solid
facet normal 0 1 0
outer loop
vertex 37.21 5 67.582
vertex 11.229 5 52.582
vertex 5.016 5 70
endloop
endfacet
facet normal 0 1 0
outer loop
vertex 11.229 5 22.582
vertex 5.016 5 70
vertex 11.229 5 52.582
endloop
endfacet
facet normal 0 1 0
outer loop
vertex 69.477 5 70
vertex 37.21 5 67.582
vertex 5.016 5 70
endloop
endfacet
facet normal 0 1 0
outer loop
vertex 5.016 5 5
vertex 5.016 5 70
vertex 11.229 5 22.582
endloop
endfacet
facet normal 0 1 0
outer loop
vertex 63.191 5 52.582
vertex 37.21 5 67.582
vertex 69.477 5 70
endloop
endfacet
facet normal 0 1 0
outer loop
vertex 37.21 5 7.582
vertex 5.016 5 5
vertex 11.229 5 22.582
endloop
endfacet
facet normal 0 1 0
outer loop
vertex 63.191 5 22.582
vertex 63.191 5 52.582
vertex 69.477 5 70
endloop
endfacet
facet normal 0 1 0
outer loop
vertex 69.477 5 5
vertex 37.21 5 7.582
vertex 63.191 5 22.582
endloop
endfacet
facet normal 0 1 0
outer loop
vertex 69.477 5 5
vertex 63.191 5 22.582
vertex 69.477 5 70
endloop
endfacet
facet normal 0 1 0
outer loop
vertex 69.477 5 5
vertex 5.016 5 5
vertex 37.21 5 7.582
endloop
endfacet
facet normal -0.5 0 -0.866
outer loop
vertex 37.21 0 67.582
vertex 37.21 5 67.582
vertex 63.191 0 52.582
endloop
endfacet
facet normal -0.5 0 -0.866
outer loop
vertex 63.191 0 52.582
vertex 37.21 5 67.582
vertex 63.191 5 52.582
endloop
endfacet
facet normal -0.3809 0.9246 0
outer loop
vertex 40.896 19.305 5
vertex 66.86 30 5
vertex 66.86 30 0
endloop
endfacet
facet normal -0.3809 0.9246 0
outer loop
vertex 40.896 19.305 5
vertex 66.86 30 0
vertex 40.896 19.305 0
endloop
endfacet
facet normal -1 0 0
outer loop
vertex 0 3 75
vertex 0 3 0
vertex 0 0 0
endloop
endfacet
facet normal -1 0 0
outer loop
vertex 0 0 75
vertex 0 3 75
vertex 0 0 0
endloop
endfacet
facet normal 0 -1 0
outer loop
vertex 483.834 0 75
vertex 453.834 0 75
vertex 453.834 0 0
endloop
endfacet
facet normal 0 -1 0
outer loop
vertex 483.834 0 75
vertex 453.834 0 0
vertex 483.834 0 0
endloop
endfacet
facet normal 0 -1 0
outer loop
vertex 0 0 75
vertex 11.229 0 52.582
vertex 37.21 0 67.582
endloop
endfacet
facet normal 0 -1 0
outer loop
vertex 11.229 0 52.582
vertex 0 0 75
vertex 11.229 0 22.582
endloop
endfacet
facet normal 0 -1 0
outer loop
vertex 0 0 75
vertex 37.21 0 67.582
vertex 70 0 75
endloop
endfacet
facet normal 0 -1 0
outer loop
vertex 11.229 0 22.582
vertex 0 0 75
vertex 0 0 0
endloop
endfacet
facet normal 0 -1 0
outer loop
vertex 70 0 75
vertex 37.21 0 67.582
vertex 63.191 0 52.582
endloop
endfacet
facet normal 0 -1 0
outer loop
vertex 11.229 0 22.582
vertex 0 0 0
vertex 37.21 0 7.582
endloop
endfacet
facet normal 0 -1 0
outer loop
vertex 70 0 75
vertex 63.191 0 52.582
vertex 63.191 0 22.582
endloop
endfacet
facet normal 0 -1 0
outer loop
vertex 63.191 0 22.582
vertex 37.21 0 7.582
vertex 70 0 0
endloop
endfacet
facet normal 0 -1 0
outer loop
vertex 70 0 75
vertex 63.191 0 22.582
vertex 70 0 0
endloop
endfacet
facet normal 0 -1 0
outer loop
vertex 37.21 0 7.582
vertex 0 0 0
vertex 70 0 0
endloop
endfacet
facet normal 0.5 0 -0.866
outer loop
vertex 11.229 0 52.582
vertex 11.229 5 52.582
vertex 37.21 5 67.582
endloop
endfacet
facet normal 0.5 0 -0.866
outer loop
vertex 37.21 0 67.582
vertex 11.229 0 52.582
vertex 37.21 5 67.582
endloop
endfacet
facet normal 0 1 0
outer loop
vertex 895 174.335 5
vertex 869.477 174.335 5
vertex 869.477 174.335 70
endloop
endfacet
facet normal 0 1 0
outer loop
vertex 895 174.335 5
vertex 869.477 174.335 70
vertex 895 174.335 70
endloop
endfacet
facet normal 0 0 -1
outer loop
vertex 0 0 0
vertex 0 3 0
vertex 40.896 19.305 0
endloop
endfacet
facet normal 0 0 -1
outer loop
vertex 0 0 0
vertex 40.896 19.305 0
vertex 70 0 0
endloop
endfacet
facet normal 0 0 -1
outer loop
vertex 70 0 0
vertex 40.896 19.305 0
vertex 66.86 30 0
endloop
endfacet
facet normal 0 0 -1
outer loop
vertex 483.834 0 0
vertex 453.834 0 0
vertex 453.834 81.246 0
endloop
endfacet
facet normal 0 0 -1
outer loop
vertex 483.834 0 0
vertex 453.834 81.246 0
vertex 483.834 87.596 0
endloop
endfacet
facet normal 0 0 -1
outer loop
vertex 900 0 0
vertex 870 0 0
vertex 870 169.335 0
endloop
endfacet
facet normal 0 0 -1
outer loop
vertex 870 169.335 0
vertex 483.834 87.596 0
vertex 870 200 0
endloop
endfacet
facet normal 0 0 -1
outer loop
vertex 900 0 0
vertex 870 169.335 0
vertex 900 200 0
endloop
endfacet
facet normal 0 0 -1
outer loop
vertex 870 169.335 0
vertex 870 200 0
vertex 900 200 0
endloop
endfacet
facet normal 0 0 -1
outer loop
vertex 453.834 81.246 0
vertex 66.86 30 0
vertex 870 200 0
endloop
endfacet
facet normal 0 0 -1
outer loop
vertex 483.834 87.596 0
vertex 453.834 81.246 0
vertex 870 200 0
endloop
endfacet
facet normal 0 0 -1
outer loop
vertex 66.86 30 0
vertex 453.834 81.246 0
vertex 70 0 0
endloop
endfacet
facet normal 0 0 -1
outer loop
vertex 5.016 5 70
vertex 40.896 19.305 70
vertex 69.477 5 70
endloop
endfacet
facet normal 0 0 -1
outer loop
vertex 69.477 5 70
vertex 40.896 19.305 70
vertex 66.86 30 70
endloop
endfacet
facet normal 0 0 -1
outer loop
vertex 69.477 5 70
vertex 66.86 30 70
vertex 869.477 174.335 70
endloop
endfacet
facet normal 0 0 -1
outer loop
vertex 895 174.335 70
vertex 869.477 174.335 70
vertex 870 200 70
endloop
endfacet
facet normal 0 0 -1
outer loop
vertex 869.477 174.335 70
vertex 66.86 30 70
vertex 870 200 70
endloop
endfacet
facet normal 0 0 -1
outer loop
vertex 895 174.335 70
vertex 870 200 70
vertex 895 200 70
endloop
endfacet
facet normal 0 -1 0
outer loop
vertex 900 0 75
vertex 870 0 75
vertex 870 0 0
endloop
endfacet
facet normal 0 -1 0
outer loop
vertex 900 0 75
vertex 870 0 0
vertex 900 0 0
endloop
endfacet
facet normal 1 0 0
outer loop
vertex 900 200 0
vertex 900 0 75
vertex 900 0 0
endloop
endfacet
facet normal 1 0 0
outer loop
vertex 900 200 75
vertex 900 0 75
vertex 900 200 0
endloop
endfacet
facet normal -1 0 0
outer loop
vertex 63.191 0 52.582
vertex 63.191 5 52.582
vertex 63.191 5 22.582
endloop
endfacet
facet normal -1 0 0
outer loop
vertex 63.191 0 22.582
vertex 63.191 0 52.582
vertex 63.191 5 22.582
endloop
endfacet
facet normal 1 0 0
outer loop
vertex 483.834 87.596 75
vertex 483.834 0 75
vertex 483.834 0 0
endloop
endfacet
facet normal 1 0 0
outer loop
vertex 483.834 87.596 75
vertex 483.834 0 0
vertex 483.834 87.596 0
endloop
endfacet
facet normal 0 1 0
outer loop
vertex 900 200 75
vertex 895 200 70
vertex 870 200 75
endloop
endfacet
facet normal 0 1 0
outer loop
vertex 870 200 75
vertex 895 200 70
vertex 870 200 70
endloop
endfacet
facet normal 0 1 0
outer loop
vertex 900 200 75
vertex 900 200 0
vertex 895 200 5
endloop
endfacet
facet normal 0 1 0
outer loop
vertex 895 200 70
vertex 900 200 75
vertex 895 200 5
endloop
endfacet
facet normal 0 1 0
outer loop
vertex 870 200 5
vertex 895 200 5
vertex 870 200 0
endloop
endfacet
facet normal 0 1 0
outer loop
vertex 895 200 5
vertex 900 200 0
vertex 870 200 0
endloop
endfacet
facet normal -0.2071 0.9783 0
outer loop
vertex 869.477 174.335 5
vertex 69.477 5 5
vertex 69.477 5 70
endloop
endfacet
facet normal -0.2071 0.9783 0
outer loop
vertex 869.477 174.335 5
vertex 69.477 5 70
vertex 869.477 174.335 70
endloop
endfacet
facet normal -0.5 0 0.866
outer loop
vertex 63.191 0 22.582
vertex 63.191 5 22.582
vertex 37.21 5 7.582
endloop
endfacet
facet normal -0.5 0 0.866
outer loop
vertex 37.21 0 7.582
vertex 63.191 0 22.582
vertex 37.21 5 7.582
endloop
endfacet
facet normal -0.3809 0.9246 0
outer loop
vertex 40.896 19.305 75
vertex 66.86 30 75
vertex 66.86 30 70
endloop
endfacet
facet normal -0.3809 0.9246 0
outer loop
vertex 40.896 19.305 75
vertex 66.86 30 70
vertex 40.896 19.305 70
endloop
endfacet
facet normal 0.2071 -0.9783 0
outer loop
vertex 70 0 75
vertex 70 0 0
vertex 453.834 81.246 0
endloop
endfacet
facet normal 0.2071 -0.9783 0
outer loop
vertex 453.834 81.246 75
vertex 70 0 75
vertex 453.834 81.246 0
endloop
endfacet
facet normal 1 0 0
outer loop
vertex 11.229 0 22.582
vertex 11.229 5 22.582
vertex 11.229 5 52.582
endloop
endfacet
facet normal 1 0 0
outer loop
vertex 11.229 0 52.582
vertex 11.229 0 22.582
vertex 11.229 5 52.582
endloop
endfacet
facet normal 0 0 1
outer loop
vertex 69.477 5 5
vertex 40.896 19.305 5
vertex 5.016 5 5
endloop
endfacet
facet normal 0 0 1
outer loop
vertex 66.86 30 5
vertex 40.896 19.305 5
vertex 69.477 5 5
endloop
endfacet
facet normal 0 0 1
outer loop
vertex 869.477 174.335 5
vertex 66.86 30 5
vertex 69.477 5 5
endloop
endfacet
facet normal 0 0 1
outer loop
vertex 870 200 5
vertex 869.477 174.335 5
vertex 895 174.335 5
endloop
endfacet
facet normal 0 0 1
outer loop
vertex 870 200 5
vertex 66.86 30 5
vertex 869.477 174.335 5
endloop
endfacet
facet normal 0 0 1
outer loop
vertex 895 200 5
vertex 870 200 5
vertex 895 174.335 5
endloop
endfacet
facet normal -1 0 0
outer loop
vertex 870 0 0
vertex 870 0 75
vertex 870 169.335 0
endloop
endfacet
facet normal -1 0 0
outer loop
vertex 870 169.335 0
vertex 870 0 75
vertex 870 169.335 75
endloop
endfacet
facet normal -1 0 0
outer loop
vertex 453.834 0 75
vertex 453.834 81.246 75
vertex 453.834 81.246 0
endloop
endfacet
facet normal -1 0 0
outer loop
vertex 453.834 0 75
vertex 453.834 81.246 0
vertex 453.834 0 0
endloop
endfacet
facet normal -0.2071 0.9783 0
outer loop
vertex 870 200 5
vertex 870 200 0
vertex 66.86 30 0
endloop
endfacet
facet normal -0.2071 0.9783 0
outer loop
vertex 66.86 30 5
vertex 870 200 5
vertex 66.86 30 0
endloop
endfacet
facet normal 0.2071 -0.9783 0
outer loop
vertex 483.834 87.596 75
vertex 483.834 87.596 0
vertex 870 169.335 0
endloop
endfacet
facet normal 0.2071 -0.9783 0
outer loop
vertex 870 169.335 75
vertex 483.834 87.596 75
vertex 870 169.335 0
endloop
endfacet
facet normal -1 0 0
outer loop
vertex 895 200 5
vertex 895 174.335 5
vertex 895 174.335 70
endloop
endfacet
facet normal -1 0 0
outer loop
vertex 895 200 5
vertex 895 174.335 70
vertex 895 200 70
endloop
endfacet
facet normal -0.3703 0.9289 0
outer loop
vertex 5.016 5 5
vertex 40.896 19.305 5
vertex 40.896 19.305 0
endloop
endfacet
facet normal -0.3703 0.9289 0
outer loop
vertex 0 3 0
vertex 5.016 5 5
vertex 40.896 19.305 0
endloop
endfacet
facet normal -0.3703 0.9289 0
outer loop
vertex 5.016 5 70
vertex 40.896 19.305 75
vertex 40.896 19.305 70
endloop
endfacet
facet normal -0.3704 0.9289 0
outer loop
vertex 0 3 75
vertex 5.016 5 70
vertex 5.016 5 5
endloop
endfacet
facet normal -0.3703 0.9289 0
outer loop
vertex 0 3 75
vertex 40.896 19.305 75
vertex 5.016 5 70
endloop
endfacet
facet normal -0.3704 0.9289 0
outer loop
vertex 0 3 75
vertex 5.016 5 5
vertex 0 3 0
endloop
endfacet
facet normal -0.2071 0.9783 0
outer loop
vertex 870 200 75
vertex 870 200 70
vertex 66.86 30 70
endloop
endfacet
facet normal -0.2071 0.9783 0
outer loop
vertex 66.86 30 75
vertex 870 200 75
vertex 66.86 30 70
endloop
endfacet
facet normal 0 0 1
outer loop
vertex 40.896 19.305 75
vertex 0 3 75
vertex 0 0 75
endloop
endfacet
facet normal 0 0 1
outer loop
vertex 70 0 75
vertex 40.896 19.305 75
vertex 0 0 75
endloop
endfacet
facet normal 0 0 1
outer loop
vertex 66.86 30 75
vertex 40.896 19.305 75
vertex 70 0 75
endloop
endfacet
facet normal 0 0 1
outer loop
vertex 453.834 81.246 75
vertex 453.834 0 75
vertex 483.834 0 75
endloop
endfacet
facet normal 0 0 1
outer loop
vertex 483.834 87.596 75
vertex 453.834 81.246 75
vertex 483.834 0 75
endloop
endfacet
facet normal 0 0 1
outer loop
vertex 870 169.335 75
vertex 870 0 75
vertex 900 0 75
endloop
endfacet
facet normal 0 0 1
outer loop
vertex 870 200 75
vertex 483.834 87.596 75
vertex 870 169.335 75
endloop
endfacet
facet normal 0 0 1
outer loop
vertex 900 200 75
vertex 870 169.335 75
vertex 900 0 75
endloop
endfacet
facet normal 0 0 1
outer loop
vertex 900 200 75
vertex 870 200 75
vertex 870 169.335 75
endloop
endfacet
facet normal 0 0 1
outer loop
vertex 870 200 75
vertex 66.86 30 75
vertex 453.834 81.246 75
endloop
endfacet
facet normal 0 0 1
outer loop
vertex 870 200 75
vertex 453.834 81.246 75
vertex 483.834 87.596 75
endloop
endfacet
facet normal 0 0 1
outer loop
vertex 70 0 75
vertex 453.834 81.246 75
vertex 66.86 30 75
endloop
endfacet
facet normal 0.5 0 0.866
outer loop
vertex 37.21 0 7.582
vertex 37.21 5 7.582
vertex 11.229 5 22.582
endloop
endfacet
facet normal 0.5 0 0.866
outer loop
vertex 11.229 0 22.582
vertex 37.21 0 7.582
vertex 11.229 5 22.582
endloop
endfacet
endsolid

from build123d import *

# Parameters (mm, degrees)
BOSS_EXTRUDE2_DEPTH = 75
SHELL1_T            = -5
CUT_EXTRUDE2_DEPTH  = 60
CUT_EXTRUDE4_DEPTH  = 90
SKETCH12_W          = 30
SKETCH12_H          = 169.335306301
BOSS_EXTRUDE5_DEPTH = 75


with BuildPart() as part:
    # Sketch2 → Boss-Extrude2 (new body)
    with BuildSketch(Plane.XY):
        Polygon((0, 0), (70, 0), (870, 169.335306301), (900, 169.335306301), (900, 200), (870, 200), (66.859751398, 30), (0, 30), align=None)
    extrude(amount=BOSS_EXTRUDE2_DEPTH)

    # Shell1
    shell1_openings = [part.faces().sort_by_distance(p)[0] for p in [
        (33.429875699, 30, 37.5),
        (468.429875699, 115, 37.5),
        (885, 200, 37.5),
    ]]
    offset(amount=SHELL1_T, openings=shell1_openings, kind=Kind.INTERSECTION)

    # Sketch9 → Cut-Extrude2 (cut)
    with BuildSketch(Plane(origin=(0, 5, 0), x_dir=(1, 0, 0), z_dir=(0, 1, 0))):
        Polygon((37.210185308, -7.581831093), (11.229423195, -22.581831093), (11.229423195, -52.581831093), (37.210185308, -67.581831093), (63.190947422, -52.581831093), (63.190947422, -22.581831093), align=None)
    extrude(amount=-CUT_EXTRUDE2_DEPTH, mode=Mode.SUBTRACT)

    # Sketch11 → Cut-Extrude4 (cut)
    with BuildSketch(Plane.XY.offset(75)):
        Polygon((66.859751398, 30), (40.895726077, 19.305163659), (0, 3), (0, 30), align=None)
    extrude(amount=-CUT_EXTRUDE4_DEPTH, mode=Mode.SUBTRACT)

    # Sketch12 → Boss-Extrude5 (add)
    with BuildSketch(Plane.XY.offset(75)):
        with Locations((885, 84.667653151)):
            Rectangle(SKETCH12_W, SKETCH12_H)
        Polygon((453.833635791, 81.245732857), (453.833635791, 0), (483.833635791, 0), (483.833635791, 87.595806843), align=None)
    extrude(amount=-BOSS_EXTRUDE5_DEPTH)


solid = part.part
